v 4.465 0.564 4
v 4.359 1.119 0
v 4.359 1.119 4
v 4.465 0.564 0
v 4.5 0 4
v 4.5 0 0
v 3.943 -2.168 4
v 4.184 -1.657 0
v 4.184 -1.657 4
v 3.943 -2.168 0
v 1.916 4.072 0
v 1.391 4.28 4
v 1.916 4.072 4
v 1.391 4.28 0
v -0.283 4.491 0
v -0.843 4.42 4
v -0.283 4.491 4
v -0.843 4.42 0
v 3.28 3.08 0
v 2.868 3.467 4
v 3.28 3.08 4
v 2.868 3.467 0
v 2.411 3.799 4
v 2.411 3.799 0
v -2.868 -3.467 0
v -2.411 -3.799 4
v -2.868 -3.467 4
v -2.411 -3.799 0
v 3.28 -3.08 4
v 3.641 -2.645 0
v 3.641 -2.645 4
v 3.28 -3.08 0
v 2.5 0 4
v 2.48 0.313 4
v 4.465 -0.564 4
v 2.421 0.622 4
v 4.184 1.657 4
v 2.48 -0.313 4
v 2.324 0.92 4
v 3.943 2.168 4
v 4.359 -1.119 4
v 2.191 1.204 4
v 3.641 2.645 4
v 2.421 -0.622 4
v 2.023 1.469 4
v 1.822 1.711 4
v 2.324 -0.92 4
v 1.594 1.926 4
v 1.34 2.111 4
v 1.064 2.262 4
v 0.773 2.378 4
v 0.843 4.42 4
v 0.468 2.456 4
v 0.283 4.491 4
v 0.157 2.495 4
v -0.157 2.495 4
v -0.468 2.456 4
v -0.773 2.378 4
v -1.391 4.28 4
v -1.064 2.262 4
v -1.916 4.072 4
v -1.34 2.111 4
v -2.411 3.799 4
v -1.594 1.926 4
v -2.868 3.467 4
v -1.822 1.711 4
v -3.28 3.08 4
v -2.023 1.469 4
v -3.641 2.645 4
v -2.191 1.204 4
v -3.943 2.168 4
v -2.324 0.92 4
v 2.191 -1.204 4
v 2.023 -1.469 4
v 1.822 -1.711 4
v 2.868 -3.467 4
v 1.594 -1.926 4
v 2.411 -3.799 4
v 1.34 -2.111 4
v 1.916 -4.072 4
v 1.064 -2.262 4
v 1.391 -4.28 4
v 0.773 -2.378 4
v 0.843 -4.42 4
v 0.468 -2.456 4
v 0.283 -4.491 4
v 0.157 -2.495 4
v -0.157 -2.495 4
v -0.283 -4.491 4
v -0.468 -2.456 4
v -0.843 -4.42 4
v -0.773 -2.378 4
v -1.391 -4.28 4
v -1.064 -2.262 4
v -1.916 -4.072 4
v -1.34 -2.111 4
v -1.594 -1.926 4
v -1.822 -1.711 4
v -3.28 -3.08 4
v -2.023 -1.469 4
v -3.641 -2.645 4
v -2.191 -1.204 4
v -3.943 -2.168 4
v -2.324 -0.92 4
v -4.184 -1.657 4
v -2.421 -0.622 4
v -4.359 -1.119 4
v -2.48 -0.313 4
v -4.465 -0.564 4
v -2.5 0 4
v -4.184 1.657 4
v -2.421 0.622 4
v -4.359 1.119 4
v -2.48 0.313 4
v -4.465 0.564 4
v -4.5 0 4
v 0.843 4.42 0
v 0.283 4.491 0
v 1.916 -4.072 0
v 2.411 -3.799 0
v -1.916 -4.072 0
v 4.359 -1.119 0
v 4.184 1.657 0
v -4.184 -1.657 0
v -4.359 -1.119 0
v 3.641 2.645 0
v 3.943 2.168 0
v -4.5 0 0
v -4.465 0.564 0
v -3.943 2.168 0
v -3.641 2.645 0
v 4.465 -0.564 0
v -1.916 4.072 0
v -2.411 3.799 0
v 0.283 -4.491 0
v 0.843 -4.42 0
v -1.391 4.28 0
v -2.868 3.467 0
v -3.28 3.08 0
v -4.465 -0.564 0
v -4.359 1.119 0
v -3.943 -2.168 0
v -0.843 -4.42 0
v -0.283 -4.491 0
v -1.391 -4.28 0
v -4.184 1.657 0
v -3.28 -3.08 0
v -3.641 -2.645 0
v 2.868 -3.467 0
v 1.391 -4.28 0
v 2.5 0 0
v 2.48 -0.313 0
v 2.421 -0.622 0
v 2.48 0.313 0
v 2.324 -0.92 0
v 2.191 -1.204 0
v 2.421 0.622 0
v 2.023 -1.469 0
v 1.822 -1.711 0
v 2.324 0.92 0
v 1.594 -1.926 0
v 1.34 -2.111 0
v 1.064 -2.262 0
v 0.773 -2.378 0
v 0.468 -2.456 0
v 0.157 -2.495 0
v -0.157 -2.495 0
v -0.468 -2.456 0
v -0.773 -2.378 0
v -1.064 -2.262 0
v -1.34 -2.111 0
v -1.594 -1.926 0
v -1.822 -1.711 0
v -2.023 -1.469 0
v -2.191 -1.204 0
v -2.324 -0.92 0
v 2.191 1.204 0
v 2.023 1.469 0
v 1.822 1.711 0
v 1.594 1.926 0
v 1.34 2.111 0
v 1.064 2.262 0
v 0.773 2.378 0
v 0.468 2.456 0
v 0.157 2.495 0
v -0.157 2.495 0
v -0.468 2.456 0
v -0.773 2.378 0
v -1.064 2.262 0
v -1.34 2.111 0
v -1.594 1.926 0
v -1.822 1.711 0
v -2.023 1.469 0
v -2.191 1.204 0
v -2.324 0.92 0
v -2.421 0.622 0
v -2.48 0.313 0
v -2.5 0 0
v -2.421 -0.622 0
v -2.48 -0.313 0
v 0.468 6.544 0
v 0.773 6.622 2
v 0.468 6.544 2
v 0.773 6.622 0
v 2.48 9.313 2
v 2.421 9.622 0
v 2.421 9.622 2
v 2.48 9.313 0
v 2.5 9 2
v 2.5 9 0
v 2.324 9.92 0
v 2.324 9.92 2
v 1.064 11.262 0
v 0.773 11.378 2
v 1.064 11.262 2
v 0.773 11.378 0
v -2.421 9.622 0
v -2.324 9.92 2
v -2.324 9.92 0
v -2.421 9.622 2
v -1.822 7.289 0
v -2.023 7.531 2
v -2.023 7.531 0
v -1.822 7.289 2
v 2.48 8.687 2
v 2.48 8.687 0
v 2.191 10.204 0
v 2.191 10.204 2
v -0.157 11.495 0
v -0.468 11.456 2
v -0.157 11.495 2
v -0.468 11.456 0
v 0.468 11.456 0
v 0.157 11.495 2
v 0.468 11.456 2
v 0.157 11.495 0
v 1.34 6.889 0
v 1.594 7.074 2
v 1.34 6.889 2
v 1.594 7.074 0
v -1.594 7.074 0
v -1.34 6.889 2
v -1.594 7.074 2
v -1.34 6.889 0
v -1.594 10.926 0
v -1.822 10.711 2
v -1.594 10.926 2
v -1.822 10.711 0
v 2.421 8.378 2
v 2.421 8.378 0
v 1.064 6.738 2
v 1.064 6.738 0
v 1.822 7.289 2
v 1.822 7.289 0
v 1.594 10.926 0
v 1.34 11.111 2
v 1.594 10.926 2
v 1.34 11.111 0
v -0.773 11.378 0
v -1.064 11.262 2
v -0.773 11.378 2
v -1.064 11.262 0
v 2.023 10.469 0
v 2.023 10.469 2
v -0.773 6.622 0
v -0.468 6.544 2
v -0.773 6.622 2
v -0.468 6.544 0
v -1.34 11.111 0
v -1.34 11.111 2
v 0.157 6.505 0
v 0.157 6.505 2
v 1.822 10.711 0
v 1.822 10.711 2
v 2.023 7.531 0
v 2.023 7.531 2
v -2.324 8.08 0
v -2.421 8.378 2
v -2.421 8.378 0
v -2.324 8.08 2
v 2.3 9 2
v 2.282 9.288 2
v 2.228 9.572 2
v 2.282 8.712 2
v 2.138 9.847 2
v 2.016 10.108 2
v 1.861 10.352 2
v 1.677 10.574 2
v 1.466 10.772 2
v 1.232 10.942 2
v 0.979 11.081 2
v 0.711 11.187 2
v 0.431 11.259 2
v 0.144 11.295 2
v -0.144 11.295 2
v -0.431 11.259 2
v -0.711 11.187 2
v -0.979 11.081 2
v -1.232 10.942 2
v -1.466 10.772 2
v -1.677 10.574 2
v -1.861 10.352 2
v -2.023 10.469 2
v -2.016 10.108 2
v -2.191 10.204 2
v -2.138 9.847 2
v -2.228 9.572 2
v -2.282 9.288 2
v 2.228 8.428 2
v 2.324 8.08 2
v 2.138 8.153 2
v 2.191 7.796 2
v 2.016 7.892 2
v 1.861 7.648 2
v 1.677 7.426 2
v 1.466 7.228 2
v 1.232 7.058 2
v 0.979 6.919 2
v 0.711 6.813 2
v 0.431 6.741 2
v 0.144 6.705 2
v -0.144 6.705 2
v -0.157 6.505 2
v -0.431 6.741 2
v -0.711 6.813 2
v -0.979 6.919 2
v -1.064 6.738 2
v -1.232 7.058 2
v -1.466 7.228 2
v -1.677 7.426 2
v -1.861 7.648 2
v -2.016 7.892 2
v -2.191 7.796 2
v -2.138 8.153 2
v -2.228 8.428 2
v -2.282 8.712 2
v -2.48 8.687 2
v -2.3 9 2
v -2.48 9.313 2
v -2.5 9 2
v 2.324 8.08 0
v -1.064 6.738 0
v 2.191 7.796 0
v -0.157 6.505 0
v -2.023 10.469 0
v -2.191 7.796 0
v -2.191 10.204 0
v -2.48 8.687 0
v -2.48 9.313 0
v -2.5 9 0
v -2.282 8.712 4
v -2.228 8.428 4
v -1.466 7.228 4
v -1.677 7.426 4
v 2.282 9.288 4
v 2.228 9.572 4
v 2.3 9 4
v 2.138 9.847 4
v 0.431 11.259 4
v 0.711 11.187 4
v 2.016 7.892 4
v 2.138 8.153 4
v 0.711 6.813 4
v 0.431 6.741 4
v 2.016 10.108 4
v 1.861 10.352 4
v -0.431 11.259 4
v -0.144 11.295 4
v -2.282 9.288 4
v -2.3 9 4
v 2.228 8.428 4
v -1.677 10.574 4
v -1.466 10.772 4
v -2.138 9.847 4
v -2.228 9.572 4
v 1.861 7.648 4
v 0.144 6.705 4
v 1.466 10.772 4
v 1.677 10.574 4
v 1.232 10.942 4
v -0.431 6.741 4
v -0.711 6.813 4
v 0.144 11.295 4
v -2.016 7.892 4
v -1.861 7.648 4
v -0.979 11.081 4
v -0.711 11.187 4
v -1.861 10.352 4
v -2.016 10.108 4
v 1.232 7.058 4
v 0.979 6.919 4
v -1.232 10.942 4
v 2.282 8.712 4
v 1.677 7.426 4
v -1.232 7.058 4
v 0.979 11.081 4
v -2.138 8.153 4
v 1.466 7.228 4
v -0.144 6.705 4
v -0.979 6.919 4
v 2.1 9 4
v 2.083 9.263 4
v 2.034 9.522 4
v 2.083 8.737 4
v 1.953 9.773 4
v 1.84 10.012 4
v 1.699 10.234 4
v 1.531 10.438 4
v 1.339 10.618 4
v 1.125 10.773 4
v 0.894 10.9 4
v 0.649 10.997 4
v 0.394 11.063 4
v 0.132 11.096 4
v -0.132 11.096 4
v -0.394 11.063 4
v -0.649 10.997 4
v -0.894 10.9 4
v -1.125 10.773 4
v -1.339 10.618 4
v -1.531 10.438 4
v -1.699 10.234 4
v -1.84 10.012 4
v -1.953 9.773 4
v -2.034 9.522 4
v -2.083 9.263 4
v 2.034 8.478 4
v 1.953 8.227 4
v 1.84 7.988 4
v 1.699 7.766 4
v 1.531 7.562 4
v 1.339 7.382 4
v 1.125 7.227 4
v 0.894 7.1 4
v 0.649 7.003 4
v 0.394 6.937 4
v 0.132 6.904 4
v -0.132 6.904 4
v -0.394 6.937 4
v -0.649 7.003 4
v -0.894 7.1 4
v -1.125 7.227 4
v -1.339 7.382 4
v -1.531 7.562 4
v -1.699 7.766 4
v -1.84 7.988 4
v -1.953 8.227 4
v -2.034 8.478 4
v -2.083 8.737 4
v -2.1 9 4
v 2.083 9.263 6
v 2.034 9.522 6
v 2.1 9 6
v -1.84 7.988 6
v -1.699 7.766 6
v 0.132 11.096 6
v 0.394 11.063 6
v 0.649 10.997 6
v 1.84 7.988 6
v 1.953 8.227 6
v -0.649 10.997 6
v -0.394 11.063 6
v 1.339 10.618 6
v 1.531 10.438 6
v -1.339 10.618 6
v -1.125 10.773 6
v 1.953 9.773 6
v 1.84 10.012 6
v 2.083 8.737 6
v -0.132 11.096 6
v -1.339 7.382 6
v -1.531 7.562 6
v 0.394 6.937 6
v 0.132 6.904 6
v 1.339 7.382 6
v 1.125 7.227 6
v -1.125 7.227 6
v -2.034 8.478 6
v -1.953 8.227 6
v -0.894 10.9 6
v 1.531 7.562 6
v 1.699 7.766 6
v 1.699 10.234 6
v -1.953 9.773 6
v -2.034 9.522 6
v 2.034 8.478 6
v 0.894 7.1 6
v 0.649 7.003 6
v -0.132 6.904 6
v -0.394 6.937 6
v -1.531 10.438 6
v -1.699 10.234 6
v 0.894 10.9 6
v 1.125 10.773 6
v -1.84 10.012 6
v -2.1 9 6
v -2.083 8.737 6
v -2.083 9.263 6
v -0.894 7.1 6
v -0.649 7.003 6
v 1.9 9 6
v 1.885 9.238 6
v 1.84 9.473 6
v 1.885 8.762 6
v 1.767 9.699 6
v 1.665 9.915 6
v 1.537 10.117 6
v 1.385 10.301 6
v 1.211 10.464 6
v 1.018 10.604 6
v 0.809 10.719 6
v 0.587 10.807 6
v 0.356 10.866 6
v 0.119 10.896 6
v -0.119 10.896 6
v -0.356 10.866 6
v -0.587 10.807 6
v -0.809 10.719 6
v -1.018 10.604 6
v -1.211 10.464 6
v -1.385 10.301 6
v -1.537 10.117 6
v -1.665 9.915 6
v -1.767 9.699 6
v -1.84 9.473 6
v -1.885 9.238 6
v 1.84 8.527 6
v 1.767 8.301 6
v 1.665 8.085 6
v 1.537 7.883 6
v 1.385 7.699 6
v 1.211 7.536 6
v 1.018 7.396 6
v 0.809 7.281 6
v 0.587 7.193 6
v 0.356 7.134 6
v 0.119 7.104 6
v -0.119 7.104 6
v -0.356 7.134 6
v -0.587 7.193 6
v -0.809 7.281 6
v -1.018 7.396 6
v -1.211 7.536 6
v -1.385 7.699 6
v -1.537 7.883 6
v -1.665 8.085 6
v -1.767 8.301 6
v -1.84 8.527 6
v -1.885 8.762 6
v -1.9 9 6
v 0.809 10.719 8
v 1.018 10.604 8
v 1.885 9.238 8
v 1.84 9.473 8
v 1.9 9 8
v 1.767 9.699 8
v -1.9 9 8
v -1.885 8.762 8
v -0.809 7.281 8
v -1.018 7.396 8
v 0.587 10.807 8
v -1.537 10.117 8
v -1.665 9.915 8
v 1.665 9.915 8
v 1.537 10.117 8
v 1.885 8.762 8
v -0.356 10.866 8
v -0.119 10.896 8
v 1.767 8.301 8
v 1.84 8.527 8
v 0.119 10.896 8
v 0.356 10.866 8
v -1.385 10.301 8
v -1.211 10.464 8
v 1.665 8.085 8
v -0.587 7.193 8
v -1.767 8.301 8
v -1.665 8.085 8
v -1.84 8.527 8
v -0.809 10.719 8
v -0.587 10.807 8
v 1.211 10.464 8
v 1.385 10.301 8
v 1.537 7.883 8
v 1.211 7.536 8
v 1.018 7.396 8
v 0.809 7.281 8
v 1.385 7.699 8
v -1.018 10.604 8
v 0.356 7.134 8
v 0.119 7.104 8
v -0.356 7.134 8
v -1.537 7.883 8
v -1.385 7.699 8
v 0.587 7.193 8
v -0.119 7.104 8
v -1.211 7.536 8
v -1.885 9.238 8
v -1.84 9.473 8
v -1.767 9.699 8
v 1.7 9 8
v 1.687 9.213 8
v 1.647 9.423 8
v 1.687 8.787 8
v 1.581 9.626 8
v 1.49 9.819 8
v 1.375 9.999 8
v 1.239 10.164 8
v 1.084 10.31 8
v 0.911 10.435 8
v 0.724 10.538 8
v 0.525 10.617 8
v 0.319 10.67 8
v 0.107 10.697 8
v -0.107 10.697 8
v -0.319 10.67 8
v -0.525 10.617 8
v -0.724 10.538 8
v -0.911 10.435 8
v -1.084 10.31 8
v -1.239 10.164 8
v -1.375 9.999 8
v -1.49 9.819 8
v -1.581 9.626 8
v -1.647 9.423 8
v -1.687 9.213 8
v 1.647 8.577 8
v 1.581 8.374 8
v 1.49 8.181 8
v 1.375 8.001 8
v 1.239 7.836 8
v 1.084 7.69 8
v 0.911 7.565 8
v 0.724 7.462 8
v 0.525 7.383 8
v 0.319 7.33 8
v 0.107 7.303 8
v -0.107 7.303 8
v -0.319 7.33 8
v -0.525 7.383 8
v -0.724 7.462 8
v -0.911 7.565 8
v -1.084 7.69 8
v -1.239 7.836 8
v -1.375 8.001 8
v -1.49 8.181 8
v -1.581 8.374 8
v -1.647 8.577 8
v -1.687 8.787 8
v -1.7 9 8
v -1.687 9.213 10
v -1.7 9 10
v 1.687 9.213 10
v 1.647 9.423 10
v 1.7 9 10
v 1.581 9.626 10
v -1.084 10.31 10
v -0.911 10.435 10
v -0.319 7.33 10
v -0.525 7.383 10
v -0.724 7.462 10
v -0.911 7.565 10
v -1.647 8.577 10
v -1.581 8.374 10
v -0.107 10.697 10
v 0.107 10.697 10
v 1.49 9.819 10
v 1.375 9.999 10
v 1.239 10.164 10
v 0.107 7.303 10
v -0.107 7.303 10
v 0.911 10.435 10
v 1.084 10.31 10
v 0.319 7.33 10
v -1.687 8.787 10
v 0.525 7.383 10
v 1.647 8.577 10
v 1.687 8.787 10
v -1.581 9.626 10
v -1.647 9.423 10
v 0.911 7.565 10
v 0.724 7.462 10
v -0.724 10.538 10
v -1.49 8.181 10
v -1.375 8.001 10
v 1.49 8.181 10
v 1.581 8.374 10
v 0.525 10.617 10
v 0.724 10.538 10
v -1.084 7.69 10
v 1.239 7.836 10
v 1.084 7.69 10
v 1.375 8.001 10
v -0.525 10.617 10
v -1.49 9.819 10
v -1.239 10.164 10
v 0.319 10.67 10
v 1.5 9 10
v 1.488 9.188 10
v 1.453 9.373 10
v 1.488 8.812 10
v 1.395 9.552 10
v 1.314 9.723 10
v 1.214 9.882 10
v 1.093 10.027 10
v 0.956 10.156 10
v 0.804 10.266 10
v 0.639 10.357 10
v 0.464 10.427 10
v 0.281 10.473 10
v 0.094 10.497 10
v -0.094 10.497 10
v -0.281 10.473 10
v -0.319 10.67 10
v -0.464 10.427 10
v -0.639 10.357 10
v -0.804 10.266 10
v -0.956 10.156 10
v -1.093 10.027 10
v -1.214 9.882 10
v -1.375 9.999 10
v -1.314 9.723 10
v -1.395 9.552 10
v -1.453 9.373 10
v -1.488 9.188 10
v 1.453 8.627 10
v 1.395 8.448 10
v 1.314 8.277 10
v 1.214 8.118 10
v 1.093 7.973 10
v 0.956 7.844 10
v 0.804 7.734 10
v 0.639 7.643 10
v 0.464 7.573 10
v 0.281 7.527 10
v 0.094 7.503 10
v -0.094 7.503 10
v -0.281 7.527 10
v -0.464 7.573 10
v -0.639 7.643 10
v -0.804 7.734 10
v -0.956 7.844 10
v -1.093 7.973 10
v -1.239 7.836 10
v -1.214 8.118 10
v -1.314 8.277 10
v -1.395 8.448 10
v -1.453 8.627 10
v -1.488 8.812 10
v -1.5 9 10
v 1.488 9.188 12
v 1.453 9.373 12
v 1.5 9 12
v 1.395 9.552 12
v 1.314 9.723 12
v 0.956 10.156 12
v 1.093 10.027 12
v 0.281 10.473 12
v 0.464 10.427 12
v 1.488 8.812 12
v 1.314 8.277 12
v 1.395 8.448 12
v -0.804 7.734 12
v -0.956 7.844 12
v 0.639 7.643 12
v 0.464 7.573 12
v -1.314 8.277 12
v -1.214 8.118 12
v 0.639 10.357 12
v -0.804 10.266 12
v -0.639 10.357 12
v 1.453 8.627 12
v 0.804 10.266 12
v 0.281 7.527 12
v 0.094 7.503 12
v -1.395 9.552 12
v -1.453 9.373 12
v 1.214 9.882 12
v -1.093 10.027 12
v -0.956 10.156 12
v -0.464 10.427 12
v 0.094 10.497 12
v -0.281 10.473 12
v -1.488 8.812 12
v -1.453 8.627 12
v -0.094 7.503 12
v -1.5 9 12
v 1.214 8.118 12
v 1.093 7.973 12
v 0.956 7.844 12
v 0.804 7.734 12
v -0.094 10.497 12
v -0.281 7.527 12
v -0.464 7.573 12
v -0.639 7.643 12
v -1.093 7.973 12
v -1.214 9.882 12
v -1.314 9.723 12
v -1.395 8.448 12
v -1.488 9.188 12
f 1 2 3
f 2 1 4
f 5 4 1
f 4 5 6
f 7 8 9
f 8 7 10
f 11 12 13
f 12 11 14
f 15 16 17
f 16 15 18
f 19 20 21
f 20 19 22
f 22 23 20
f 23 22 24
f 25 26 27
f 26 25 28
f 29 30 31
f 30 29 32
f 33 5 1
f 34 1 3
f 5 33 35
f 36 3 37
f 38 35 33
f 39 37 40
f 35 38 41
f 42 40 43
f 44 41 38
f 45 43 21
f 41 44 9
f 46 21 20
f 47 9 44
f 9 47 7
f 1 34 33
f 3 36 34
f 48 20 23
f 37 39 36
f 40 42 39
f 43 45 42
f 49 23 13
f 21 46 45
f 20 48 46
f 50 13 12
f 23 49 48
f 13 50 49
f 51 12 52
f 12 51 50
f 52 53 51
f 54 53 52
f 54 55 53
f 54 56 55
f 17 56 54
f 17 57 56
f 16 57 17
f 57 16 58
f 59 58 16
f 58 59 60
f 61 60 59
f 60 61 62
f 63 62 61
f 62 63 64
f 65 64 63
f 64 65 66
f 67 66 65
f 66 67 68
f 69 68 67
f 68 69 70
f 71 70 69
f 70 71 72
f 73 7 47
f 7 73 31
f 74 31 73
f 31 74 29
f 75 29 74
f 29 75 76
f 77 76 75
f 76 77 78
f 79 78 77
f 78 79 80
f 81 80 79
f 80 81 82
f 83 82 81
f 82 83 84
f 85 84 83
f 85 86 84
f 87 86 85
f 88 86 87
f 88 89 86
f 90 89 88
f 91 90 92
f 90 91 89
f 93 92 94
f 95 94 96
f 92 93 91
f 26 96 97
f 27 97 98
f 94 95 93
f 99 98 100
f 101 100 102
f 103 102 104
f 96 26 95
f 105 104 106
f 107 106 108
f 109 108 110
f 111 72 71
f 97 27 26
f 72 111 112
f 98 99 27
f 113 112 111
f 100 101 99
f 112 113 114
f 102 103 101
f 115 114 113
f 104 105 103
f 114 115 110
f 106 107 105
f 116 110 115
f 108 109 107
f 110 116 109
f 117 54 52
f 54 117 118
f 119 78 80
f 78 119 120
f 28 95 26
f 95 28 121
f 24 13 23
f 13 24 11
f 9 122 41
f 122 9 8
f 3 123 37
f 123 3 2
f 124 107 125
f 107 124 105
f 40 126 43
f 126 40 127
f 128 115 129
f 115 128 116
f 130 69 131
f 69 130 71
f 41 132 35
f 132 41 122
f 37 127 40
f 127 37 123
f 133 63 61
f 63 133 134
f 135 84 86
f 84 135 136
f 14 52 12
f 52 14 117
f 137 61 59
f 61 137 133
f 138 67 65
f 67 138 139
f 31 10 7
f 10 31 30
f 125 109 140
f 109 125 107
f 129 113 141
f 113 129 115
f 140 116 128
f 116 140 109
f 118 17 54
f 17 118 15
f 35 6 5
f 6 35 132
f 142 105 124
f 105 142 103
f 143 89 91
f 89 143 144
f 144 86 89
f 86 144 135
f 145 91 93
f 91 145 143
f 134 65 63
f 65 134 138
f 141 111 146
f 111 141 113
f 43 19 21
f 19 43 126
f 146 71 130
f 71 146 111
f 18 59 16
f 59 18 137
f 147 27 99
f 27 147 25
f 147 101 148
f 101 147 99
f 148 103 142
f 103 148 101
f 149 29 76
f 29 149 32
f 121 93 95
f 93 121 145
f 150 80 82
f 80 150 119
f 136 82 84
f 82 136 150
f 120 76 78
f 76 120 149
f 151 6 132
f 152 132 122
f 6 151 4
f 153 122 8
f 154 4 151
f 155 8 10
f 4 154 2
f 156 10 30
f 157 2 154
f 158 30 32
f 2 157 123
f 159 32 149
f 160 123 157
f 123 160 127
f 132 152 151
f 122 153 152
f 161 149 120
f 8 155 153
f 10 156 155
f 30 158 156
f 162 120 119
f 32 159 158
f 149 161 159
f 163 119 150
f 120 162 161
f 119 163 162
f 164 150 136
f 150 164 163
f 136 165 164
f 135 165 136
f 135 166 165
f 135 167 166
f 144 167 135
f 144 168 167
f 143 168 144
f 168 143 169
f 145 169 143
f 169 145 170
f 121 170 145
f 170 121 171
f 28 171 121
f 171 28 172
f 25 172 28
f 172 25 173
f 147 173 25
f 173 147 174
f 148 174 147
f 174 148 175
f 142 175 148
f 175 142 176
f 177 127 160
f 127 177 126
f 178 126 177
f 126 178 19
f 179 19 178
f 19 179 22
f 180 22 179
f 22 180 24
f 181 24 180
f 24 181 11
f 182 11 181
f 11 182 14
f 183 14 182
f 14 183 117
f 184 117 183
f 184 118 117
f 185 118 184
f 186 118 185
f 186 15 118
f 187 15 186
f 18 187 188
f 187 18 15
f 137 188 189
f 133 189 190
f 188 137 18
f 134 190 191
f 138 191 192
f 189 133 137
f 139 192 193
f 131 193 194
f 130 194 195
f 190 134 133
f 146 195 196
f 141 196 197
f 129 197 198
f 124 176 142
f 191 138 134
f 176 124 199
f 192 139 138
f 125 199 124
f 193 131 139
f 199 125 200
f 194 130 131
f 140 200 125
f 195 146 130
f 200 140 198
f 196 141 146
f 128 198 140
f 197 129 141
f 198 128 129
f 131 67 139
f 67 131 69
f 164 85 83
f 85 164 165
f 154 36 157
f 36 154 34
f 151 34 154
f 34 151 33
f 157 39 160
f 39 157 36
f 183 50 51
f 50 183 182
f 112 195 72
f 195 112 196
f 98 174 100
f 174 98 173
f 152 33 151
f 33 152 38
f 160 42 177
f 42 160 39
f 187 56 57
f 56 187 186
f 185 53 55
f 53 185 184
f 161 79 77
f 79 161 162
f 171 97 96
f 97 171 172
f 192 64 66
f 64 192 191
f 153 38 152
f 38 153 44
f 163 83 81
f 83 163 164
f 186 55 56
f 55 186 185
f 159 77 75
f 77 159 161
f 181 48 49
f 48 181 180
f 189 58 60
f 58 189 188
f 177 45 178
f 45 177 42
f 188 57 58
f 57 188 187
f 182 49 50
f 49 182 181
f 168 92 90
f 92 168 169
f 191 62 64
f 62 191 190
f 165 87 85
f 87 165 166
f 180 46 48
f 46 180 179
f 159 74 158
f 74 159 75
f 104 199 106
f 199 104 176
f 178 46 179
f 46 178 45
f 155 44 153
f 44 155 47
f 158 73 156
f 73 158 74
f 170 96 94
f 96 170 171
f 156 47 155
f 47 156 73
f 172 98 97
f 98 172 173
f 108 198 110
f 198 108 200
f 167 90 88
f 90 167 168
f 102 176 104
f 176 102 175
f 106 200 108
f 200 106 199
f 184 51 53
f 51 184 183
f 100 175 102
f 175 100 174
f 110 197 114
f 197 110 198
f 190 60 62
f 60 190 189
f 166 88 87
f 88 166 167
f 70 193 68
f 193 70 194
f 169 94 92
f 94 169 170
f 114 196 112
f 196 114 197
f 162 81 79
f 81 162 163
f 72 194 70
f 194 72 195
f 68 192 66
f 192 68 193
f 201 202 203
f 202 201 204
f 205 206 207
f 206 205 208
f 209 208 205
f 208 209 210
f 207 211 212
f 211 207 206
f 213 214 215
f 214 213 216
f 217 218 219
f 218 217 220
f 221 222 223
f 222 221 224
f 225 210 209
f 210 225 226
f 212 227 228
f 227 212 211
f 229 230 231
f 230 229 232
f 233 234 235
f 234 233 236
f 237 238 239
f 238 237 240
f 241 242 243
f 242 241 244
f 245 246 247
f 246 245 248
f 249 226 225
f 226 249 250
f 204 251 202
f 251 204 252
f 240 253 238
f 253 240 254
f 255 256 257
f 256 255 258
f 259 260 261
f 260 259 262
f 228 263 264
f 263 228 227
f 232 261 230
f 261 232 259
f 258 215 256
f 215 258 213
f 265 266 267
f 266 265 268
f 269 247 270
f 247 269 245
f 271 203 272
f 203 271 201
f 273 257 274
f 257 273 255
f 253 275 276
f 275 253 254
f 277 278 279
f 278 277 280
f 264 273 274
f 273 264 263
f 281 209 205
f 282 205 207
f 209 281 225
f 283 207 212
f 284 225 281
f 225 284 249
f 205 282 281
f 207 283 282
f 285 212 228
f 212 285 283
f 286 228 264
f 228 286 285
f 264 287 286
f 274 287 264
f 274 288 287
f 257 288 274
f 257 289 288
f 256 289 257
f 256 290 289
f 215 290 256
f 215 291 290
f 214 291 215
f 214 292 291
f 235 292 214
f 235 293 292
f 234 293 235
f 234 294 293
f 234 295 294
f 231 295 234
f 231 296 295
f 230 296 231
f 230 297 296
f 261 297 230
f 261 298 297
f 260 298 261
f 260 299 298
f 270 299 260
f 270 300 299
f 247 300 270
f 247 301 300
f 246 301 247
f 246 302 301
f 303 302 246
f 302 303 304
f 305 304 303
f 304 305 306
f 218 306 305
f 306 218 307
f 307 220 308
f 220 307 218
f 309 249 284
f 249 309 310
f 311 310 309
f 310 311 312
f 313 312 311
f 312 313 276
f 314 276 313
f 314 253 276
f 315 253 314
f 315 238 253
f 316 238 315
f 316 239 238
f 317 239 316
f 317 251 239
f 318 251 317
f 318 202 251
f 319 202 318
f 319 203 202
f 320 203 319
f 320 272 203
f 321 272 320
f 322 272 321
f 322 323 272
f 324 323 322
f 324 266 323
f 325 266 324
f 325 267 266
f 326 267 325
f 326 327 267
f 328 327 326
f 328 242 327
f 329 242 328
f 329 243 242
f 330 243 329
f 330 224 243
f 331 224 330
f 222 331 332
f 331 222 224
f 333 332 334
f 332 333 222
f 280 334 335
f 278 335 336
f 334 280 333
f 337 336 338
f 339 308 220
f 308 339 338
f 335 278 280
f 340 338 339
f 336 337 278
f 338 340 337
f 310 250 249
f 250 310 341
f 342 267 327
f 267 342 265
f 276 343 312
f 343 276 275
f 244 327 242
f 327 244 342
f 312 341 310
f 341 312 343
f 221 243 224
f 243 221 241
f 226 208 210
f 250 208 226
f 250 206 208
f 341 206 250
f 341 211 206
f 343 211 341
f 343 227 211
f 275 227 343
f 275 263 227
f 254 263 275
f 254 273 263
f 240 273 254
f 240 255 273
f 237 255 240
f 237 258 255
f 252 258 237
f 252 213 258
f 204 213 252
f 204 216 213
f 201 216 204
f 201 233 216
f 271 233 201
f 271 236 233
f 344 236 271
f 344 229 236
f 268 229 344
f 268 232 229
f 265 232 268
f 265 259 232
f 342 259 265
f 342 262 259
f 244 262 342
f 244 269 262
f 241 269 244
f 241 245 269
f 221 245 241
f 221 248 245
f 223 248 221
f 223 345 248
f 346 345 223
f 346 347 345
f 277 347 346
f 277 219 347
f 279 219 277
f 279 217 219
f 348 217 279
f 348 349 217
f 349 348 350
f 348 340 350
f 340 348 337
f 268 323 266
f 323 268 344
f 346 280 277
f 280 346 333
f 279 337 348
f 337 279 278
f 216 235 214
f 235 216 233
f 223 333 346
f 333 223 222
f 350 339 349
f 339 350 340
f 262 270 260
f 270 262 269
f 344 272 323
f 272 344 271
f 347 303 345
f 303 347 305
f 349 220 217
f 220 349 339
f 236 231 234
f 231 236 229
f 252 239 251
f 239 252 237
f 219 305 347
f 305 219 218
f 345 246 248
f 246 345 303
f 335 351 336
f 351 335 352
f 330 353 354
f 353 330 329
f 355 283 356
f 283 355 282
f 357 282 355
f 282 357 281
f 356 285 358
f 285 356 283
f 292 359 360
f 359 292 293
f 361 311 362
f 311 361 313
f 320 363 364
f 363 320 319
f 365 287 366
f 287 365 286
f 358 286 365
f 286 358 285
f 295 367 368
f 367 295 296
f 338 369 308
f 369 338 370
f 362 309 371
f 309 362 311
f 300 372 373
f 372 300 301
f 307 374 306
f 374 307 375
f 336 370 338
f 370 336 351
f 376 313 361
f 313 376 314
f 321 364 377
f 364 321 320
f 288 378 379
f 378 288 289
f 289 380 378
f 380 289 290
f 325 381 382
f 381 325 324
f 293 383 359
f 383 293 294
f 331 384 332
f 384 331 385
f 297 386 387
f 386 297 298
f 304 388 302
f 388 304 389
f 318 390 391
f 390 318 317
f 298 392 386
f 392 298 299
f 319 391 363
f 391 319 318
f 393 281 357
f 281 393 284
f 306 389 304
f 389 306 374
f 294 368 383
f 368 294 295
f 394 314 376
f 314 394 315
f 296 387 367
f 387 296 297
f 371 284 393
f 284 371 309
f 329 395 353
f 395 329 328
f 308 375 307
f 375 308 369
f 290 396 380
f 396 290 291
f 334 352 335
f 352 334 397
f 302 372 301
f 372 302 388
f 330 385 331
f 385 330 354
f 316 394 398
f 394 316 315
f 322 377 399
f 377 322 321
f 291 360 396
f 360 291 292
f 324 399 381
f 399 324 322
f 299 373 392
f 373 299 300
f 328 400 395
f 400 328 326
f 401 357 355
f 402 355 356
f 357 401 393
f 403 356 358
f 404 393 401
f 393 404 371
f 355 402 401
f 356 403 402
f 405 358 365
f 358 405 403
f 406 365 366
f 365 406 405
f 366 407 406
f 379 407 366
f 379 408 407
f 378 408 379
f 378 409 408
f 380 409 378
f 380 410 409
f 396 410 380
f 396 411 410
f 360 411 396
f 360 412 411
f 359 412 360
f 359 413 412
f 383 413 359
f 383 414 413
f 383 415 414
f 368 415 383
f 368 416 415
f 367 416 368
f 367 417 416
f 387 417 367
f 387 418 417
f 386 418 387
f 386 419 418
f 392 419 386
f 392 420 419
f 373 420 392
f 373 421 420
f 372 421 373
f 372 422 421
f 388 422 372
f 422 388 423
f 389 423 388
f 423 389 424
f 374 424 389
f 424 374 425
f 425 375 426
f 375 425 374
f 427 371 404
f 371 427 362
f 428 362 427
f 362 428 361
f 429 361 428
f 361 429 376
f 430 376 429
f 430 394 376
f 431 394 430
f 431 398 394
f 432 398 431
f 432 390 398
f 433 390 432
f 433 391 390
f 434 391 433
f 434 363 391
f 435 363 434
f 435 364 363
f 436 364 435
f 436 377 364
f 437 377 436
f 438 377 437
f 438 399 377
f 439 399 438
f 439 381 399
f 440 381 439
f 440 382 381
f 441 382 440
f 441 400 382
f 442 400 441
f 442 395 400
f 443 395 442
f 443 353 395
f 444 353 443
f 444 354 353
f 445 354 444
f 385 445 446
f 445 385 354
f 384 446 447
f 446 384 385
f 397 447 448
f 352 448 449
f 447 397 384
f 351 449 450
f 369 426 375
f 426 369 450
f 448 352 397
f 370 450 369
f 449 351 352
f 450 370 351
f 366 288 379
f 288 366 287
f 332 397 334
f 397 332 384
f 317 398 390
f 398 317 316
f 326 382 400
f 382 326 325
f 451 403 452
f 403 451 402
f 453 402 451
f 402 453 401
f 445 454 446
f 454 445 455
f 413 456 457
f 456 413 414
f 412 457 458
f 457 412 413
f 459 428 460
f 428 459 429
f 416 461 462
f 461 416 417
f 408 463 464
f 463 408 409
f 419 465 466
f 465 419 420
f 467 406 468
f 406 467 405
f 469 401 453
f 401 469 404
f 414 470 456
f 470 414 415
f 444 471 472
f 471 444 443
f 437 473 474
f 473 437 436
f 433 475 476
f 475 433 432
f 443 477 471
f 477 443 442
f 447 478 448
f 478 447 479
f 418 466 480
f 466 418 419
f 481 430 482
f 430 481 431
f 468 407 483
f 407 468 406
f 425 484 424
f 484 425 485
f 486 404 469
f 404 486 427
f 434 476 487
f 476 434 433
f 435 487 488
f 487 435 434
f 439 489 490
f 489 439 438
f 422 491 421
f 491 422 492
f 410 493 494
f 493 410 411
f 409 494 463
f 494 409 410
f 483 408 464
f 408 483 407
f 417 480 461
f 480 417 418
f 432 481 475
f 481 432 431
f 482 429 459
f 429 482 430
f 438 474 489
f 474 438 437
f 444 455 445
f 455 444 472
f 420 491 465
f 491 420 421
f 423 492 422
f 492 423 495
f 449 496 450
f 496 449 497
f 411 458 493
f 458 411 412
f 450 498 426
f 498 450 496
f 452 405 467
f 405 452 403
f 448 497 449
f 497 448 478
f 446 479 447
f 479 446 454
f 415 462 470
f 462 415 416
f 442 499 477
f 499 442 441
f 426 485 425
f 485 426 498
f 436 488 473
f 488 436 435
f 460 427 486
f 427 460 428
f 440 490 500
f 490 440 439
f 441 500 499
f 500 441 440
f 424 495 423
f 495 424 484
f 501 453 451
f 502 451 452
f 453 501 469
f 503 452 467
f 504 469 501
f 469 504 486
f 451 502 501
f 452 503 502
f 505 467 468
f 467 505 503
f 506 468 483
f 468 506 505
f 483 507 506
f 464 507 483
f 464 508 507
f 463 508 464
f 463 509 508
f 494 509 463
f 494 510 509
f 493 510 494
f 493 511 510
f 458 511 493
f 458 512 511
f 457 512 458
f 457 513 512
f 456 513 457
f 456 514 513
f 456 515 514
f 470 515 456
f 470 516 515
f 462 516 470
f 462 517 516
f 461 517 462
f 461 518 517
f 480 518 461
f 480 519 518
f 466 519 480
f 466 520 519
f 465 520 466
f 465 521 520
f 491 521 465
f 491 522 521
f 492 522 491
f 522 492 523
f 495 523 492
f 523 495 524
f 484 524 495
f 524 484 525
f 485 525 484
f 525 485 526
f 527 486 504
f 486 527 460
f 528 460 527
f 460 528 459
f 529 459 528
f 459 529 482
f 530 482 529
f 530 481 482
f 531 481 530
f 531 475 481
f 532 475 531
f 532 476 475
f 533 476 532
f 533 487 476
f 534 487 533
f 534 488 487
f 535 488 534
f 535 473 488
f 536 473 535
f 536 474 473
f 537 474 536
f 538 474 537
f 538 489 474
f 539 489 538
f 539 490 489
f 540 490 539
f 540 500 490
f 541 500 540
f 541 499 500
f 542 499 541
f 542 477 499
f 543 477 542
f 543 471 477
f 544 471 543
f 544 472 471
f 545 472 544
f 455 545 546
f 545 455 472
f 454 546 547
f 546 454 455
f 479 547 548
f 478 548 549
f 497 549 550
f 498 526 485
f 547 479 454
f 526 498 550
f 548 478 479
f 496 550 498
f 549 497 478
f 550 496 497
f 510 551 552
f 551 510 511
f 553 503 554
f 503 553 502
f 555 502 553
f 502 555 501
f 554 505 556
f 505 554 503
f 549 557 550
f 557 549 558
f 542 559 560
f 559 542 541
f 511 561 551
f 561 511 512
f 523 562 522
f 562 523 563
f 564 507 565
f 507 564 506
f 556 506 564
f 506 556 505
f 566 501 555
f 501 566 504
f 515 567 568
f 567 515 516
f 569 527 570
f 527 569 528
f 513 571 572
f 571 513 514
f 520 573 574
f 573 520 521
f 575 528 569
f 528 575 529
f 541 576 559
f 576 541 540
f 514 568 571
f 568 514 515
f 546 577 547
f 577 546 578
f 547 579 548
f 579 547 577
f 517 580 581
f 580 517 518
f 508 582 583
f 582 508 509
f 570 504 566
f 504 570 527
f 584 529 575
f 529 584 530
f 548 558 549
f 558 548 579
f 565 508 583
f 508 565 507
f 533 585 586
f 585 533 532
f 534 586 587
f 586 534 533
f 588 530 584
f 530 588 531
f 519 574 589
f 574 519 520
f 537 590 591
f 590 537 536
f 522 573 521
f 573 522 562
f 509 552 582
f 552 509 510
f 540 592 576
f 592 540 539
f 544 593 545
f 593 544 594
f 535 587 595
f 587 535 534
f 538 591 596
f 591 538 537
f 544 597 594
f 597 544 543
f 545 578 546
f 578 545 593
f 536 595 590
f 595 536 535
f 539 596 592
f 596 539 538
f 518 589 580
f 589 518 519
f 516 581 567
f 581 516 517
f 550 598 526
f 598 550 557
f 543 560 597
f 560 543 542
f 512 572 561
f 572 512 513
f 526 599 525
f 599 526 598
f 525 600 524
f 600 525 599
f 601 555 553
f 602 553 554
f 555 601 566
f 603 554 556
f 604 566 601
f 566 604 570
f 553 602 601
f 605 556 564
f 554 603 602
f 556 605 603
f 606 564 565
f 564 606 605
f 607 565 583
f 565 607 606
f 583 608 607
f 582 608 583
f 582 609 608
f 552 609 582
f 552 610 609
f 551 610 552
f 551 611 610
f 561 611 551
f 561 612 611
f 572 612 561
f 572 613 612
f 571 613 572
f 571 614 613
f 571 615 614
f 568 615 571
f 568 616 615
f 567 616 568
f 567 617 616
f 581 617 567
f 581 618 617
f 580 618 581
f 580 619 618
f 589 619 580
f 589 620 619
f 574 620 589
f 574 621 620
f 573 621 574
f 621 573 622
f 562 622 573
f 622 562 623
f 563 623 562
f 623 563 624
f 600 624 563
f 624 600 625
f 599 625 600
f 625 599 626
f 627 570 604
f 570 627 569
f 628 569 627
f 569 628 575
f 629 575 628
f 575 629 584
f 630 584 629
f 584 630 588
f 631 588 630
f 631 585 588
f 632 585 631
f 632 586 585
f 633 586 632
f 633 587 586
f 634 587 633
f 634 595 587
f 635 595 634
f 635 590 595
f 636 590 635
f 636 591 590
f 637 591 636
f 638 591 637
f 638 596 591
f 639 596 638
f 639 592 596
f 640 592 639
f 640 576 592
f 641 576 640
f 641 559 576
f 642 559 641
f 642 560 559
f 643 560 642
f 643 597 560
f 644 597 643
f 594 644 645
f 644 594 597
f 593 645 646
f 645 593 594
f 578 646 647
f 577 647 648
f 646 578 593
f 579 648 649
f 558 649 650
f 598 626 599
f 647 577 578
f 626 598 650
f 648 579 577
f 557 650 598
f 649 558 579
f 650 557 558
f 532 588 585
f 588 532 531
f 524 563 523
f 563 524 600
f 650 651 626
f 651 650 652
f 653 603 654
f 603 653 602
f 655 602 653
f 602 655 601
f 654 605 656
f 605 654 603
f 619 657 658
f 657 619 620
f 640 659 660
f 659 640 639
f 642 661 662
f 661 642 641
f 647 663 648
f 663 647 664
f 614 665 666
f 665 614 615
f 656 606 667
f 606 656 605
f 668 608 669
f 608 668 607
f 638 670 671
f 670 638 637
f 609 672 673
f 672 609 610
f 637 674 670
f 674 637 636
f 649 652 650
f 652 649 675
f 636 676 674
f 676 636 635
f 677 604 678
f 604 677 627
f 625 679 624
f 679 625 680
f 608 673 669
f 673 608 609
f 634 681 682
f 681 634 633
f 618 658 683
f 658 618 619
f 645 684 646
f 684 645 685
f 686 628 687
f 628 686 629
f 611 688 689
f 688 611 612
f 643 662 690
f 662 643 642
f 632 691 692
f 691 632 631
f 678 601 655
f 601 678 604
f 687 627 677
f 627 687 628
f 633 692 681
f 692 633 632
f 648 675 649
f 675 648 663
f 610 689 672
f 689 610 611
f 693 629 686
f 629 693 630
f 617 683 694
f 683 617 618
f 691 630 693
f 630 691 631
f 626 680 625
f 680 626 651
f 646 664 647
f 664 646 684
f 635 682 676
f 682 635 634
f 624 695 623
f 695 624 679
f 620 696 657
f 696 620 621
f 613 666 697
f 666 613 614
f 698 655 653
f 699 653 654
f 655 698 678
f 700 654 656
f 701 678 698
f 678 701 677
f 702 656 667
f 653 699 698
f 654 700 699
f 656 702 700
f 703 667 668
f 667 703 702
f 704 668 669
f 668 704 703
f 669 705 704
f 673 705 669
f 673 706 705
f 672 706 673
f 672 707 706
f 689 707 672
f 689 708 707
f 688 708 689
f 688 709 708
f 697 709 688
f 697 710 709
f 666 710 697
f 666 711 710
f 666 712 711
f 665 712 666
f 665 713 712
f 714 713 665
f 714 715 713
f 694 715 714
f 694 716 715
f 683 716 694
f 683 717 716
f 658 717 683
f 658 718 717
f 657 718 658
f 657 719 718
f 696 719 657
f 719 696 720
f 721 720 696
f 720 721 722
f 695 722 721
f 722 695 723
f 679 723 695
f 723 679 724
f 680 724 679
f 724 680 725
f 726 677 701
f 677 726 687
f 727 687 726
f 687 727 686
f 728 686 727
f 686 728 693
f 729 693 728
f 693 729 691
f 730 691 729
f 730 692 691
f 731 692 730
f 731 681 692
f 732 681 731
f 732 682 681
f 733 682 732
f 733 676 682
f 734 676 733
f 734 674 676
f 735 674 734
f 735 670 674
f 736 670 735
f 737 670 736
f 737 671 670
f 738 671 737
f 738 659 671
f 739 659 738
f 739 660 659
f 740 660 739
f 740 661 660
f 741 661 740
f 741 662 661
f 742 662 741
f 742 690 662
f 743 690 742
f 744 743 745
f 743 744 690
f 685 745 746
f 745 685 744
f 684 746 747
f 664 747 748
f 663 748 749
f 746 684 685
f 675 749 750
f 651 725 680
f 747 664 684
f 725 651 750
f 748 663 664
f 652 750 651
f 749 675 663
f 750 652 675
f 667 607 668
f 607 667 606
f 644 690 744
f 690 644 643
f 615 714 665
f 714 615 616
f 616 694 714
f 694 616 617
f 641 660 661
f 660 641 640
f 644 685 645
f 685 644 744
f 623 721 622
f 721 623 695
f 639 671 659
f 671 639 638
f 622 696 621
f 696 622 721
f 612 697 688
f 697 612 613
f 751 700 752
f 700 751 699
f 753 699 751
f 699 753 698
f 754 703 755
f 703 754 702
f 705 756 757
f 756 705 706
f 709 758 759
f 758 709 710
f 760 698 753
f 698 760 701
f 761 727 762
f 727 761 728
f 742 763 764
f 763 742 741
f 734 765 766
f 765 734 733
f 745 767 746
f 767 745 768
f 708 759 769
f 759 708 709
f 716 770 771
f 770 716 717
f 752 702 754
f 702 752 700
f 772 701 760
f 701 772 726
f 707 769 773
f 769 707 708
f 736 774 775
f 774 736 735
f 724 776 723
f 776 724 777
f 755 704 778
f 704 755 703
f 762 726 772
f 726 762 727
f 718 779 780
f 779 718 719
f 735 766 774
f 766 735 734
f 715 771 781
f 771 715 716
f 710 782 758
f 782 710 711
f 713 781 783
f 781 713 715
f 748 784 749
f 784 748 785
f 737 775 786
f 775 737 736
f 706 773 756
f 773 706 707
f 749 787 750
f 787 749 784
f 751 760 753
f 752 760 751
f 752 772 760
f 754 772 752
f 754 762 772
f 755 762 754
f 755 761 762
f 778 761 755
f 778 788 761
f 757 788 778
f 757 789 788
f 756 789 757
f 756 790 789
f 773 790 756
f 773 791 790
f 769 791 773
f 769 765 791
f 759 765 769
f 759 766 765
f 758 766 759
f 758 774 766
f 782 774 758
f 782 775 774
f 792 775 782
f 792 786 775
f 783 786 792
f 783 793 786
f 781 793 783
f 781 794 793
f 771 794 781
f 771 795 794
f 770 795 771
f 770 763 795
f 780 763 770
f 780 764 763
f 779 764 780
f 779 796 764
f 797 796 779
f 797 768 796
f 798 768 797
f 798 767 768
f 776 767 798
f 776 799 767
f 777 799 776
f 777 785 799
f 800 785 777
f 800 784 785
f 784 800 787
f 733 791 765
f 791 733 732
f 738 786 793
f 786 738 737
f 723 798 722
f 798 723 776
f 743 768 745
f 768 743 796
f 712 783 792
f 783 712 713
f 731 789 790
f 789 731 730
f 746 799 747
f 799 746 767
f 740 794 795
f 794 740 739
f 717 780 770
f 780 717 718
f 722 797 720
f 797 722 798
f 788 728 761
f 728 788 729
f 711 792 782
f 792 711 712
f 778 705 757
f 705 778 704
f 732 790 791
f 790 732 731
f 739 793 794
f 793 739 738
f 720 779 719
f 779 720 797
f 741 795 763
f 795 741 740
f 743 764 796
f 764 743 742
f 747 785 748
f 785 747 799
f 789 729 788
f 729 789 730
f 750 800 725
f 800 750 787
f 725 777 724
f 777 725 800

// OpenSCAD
// configured for customizer

// Height of the test ring (steps on the column will be 1/2 this height)
height = 4;		// [4:10]

// Diameter of the inner hole (the target test size)
holeID = 5;		// [4:10]

// Difference between successive rings on the column (in 1/100 of a mm; 5 = 0.05 mm)
offsetStep = 20;		// [5:100]

// How many steps should there be on the column (beyond the full size ring at the bottom)
steps = 5;


// variables below here will not show up in the customizer

$fn=50 + 0; // How many slices should the circles have (circle accuracy)

radius = holeID / 2;
outerRadius = radius + max(2, radius/2);
halfHeight = height / 2;

difference()
{
	cylinder(r=outerRadius, h=height);
	translate([0,0,-1])
		cylinder(r=radius, h=height+2);
}

//color("red")
translate([0, outerRadius + radius + 2, 0])
{
	for (i = [0:steps])
	{
		translate([0,0,i*halfHeight])
			cylinder(r=radius - (i*(offsetStep/100)), h=halfHeight);
	}
}
